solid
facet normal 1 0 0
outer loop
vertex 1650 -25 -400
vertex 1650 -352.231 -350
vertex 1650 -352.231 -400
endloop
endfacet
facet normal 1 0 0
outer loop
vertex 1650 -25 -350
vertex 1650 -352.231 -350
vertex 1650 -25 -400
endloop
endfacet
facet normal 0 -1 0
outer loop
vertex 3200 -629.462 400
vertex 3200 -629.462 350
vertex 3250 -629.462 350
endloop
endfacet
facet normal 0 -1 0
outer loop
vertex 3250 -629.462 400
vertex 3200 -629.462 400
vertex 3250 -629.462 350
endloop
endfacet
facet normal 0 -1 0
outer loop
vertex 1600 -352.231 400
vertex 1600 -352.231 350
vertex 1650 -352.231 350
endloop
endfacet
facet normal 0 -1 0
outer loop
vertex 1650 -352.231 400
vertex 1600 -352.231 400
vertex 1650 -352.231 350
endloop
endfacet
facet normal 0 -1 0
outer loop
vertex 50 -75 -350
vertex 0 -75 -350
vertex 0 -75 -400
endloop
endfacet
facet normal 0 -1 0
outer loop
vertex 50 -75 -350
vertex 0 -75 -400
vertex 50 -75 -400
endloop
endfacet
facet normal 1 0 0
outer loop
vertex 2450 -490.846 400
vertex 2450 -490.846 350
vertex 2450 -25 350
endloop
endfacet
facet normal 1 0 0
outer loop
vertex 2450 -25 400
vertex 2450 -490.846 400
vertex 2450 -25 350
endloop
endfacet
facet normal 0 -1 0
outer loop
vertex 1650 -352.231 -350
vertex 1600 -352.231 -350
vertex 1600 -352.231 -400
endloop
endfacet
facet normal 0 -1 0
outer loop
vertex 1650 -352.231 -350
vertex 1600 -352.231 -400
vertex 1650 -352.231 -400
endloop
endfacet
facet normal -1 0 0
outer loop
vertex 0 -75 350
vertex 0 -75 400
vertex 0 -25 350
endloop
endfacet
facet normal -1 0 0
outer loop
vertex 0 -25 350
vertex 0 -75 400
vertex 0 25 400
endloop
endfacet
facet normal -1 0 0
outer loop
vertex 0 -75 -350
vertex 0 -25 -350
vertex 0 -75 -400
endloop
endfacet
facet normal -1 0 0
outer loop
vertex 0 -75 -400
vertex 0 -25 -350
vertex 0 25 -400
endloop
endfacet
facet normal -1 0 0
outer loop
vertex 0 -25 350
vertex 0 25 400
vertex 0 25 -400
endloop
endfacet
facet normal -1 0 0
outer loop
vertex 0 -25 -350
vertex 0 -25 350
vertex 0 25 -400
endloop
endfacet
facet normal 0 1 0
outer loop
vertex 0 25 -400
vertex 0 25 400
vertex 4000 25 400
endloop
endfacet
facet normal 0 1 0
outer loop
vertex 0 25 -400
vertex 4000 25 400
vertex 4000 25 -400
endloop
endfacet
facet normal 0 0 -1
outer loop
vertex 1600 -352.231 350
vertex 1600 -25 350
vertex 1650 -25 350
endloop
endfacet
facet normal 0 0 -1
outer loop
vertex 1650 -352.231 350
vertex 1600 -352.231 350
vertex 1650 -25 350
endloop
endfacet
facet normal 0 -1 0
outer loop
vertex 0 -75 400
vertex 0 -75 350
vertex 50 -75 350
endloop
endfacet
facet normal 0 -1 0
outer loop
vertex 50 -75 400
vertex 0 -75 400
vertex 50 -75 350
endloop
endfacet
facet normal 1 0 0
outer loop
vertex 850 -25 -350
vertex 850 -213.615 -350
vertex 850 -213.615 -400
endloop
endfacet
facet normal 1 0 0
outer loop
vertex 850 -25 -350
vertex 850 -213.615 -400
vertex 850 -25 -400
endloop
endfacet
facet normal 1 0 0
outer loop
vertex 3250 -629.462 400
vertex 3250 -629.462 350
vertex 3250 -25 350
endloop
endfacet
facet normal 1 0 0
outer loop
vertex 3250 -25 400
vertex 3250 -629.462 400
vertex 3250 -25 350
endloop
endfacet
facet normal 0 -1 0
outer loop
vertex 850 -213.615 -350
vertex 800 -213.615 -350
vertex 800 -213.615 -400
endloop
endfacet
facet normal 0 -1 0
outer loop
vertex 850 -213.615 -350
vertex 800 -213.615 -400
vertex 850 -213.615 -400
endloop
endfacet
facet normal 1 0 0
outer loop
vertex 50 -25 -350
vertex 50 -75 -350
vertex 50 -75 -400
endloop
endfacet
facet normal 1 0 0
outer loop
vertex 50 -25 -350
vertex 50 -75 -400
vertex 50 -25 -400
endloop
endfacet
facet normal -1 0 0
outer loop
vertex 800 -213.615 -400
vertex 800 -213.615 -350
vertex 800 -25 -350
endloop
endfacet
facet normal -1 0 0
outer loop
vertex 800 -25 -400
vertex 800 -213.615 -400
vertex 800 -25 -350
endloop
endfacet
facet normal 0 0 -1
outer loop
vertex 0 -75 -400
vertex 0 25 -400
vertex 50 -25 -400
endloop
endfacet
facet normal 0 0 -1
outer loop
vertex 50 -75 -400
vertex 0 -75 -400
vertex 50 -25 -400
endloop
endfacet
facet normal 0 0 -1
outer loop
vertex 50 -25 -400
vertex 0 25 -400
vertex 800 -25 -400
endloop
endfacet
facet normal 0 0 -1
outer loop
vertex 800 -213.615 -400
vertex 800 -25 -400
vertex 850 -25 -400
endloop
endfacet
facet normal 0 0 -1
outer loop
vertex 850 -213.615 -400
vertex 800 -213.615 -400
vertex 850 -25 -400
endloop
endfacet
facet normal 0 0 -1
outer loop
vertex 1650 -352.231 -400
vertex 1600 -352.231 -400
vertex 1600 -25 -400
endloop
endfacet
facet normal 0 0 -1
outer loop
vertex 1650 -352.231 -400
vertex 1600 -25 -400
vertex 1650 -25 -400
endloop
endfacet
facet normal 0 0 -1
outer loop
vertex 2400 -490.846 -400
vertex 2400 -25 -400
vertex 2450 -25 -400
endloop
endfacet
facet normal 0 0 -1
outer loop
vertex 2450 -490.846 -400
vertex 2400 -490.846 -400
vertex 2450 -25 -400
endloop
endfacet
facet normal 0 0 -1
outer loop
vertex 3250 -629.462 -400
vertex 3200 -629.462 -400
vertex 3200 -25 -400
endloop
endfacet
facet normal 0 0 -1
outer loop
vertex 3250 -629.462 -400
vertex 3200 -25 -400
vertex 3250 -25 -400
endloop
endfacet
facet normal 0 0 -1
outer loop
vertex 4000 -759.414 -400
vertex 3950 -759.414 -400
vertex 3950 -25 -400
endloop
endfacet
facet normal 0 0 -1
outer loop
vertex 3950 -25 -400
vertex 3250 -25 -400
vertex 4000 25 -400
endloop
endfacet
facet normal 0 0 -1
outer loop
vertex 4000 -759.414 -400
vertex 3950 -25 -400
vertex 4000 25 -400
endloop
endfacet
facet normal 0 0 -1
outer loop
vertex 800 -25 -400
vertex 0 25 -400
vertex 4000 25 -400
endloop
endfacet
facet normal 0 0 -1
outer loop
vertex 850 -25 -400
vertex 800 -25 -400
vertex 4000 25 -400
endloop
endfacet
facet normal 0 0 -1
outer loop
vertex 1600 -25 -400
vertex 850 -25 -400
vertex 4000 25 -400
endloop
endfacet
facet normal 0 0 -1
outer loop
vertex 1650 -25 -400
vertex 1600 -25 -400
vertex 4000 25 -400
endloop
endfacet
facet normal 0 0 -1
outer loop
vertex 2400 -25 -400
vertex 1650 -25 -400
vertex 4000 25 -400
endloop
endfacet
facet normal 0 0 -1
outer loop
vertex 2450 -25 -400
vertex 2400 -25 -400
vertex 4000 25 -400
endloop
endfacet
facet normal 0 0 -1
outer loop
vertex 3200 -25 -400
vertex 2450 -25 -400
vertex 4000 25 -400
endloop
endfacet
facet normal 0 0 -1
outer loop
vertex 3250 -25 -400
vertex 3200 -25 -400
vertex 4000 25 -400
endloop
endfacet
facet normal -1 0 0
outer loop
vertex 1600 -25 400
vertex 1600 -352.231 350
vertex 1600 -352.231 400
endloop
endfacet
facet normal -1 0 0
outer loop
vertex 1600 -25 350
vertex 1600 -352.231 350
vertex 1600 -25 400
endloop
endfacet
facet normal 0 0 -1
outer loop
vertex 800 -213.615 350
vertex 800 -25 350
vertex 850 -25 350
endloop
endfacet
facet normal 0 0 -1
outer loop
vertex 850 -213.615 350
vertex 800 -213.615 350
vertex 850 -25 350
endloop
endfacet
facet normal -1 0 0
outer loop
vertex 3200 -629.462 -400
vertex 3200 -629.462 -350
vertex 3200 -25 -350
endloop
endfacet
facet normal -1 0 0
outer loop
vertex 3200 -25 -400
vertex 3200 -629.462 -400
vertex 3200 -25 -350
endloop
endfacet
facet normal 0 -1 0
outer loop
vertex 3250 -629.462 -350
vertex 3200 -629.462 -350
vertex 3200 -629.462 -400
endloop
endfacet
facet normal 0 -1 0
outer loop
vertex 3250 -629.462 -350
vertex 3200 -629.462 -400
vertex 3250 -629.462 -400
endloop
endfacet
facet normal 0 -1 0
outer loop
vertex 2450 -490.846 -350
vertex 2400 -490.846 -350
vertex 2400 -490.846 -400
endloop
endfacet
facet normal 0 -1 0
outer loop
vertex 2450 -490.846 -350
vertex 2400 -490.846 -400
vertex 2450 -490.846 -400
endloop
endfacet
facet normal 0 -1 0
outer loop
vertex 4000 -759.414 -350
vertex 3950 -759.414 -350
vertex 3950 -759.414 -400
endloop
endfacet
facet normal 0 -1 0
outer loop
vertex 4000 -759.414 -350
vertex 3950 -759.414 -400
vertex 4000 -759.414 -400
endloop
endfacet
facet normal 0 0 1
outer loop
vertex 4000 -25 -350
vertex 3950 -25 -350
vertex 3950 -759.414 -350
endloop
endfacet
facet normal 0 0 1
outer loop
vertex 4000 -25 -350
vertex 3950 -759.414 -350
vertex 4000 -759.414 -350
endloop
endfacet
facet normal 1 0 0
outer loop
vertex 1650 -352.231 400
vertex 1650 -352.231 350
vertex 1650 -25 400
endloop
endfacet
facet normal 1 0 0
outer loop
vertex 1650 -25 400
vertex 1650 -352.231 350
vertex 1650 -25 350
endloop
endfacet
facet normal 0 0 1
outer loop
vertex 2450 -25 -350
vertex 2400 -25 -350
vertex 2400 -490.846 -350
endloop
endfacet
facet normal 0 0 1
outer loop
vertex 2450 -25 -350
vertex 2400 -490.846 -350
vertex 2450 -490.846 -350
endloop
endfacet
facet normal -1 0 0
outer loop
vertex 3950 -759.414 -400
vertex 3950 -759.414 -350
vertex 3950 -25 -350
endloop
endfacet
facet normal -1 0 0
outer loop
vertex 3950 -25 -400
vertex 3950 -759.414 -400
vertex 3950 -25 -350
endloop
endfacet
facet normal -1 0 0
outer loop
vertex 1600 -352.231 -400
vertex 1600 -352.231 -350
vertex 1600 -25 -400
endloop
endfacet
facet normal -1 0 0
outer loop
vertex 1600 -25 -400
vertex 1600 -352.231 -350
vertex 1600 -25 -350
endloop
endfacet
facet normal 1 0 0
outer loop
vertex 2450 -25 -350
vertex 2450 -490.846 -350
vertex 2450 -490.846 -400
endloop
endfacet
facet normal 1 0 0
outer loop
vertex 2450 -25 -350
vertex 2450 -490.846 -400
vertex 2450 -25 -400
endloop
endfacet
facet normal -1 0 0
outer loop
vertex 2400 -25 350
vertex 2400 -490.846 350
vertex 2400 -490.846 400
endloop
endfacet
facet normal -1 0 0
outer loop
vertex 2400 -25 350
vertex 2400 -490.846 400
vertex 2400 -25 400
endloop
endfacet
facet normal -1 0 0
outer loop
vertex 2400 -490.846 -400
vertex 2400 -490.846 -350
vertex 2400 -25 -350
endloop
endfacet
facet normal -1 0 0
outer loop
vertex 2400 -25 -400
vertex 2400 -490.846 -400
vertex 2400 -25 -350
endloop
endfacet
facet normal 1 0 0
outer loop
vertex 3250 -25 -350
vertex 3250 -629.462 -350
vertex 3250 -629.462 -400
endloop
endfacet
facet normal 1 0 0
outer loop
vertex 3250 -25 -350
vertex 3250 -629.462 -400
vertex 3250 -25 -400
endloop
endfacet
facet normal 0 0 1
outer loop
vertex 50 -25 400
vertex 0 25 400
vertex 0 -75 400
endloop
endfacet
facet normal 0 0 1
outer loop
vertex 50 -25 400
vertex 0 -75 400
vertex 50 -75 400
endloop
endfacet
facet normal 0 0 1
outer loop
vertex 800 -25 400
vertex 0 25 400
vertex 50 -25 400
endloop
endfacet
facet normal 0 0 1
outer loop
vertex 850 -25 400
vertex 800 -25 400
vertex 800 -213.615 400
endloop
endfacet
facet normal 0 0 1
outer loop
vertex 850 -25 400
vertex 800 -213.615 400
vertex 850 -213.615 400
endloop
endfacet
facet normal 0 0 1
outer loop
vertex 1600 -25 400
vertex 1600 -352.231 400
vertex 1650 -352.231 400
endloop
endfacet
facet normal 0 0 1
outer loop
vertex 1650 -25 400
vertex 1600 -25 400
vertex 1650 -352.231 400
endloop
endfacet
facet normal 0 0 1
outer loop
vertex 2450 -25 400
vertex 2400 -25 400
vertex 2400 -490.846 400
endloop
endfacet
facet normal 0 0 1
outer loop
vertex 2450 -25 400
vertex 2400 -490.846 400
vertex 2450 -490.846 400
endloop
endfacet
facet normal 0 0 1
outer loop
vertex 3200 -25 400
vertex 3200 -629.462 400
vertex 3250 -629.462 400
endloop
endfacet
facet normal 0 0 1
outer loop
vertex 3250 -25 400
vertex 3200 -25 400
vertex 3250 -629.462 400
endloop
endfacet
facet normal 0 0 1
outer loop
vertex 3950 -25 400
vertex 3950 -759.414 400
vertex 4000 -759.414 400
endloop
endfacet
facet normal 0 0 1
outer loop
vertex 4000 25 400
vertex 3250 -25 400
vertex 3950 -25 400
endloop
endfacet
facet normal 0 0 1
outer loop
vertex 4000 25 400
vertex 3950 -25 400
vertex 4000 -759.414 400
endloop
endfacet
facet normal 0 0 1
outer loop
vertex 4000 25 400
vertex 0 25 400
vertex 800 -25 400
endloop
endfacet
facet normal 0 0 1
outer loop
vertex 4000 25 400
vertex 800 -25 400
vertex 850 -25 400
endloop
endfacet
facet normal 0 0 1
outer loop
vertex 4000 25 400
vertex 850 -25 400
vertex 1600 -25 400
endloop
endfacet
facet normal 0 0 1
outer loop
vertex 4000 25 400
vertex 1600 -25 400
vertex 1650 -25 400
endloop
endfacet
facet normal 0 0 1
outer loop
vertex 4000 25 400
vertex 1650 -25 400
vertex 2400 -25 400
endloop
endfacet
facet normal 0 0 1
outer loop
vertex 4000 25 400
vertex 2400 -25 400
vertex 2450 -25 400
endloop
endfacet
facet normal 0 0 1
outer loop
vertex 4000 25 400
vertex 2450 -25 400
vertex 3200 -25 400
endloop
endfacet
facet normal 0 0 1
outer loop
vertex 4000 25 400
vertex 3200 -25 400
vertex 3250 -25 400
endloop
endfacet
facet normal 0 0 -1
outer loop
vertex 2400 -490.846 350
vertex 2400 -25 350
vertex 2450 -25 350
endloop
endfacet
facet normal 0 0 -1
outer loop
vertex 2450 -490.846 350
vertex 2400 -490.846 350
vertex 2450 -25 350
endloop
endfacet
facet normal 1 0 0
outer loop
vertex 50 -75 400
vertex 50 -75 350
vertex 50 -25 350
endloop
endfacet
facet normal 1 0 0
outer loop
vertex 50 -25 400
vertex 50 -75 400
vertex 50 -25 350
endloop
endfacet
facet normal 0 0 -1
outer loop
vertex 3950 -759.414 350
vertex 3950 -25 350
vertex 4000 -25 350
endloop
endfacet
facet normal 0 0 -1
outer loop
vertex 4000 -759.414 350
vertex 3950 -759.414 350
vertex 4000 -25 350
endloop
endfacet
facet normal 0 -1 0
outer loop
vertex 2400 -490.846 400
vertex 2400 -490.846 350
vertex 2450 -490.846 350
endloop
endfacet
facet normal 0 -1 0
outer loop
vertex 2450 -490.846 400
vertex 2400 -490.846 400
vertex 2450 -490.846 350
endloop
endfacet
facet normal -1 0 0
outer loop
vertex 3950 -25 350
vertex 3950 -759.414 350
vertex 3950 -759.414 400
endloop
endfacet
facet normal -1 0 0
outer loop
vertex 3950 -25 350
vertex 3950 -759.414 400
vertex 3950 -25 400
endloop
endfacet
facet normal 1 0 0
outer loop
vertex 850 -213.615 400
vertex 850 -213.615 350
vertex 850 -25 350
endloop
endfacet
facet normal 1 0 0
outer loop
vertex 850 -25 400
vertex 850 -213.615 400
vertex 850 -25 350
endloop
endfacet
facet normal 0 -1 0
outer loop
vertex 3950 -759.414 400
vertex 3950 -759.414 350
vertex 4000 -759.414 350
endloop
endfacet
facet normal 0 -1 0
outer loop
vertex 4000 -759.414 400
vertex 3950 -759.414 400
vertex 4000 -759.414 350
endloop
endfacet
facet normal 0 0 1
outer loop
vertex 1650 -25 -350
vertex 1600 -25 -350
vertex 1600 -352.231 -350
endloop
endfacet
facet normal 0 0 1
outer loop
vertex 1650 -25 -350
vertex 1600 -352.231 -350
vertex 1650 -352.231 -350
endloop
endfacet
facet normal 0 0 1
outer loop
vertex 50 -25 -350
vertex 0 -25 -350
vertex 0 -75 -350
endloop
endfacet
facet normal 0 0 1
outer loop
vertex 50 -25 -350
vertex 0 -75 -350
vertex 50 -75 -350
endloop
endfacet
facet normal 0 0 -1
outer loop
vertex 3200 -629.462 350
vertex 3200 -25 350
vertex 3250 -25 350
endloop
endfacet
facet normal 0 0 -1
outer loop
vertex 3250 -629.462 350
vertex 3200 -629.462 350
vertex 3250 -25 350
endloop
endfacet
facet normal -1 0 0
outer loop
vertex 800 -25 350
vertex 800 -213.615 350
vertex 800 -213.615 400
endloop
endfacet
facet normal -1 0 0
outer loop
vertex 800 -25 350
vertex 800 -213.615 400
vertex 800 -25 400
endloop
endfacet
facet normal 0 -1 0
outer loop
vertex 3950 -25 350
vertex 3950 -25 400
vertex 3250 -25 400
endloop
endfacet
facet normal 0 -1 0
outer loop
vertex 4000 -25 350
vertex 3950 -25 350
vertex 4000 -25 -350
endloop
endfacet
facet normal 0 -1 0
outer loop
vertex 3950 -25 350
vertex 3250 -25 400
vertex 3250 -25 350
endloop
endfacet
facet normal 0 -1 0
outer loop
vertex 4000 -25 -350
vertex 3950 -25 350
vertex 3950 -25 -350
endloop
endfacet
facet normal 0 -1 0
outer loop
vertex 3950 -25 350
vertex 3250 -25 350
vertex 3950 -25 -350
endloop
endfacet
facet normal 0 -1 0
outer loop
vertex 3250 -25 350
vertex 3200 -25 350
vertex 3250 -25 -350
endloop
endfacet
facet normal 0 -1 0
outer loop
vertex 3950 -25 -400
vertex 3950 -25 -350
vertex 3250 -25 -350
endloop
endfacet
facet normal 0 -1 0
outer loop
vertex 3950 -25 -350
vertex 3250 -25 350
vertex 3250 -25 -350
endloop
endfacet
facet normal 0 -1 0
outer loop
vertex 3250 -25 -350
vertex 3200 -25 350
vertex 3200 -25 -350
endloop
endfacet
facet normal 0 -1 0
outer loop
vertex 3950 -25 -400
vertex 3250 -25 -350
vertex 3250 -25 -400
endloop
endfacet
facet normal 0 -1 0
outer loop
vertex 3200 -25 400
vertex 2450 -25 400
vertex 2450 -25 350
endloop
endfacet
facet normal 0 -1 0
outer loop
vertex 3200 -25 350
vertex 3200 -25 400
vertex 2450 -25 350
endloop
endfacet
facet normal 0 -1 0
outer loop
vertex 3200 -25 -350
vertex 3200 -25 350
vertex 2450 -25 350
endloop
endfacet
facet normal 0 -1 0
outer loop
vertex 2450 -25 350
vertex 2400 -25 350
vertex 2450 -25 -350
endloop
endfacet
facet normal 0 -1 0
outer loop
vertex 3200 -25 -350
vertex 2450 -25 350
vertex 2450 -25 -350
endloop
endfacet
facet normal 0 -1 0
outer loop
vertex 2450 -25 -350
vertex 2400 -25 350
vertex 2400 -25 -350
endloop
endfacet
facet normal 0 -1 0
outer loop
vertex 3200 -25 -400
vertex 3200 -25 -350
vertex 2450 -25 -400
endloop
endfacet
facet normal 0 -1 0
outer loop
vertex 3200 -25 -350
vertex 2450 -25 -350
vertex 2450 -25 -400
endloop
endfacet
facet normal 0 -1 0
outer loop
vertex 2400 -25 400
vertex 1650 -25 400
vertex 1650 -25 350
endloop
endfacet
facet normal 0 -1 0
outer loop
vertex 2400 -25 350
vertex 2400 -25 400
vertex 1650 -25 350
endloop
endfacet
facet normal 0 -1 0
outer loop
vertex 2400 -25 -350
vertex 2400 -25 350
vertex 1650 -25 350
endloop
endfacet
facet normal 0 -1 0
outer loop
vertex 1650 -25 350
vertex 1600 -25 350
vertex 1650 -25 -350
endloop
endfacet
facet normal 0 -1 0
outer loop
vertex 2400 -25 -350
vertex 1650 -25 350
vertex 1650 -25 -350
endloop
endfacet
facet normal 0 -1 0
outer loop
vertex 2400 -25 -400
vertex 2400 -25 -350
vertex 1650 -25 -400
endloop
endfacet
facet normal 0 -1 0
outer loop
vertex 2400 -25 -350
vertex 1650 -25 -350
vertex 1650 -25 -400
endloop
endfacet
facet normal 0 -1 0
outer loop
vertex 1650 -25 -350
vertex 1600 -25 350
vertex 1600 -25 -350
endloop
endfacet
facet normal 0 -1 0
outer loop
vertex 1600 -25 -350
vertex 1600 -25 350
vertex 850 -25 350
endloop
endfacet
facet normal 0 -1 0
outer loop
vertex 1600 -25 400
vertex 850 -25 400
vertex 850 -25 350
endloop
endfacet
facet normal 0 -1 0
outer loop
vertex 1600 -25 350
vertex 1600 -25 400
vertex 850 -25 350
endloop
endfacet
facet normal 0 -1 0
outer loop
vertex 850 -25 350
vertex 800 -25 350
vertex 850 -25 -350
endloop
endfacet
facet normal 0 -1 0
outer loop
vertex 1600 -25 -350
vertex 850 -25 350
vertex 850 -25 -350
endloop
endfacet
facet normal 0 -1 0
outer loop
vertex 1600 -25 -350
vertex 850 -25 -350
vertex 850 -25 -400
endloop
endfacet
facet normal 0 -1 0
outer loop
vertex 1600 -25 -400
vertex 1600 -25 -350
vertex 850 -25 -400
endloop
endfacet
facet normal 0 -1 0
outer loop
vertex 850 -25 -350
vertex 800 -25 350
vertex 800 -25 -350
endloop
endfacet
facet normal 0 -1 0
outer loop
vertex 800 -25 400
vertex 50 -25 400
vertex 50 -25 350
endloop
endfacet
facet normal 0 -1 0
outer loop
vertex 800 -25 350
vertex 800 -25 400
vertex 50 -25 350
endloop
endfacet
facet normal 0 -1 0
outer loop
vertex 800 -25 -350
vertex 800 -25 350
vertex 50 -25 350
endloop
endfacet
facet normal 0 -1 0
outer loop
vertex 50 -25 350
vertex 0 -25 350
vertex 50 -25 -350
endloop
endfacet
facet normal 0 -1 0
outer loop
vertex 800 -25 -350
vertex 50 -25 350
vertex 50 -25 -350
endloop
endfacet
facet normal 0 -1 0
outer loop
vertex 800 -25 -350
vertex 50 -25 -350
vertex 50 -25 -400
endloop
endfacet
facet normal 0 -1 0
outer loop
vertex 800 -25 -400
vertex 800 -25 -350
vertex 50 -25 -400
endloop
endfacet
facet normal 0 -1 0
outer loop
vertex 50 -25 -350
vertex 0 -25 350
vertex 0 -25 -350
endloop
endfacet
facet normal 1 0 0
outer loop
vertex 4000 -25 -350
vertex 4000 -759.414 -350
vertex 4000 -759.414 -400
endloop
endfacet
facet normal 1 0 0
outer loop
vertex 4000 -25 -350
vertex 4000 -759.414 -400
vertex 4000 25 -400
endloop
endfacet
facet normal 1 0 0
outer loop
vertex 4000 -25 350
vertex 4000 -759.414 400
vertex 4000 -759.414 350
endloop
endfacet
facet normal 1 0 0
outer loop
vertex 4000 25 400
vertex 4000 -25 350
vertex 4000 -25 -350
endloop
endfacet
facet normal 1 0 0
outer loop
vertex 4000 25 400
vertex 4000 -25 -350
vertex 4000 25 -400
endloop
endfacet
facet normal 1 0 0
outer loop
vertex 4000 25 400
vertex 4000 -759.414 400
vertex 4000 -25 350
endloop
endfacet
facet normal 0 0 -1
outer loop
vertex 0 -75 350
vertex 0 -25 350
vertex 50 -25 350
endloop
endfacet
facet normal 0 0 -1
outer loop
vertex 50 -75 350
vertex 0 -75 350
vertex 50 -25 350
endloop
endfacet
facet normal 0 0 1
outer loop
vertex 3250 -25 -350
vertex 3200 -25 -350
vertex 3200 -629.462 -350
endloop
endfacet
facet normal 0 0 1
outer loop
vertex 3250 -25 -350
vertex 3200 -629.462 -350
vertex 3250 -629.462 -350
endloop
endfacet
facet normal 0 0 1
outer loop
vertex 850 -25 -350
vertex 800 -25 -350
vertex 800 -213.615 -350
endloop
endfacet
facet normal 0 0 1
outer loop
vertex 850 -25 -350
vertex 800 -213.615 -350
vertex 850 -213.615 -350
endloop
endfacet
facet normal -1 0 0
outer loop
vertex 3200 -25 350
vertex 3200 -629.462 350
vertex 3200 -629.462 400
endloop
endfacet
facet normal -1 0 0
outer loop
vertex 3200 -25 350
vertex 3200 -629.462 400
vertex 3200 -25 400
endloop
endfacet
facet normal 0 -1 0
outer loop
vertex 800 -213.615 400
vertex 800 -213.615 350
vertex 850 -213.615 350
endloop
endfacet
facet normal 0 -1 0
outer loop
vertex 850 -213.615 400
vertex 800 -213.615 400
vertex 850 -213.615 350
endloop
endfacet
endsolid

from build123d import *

# Parameters (mm, degrees)
ESBO_O1_W                      = 800
ESBO_O1_H                      = 50
RESSALTO_EXTRUS_O1_DEPTH       = 4000
RESSALTO_EXTRUS_O2_START       = 350
RESSALTO_EXTRUS_O2_OUTLINE_W   = 50
RESSALTO_EXTRUS_O2_OUTLINE_H   = 734.413585936
RESSALTO_EXTRUS_O2_OUTLINE_H_2 = 50
RESSALTO_EXTRUS_O2_OUTLINE_H_3 = 188.61540981
RESSALTO_EXTRUS_O2_OUTLINE_H_4 = 327.23081962
RESSALTO_EXTRUS_O2_OUTLINE_H_5 = 465.84622943
RESSALTO_EXTRUS_O2_OUTLINE_H_6 = 604.461639239
RESSALTO_EXTRUS_O2_DEPTH       = 50


# Read off the part's stored shape, not the designer's step: Ressalto-extrusão2
with BuildPart() as part:
    # Esboço1 → Ressalto-extrusão1 (new body)
    with BuildSketch(Plane(origin=(0, 0, 0), x_dir=(0, 0, -1), z_dir=(1, 0, 0))):
        Rectangle(ESBO_O1_W, ESBO_O1_H)
    extrude(amount=RESSALTO_EXTRUS_O1_DEPTH)

    # Ressalto-extrusão2 outline → Ressalto-extrusão2 (add)
    with BuildSketch(Plane.XY.offset(RESSALTO_EXTRUS_O2_START)):
        with Locations((3975, -392.206792968)):
            Rectangle(RESSALTO_EXTRUS_O2_OUTLINE_W, RESSALTO_EXTRUS_O2_OUTLINE_H)
        with Locations((25, -50)):
            Rectangle(RESSALTO_EXTRUS_O2_OUTLINE_W, RESSALTO_EXTRUS_O2_OUTLINE_H_2)
        with Locations((825, -119.307704905)):
            Rectangle(RESSALTO_EXTRUS_O2_OUTLINE_W, RESSALTO_EXTRUS_O2_OUTLINE_H_3)
        with Locations((1625, -188.61540981)):
            Rectangle(RESSALTO_EXTRUS_O2_OUTLINE_W, RESSALTO_EXTRUS_O2_OUTLINE_H_4)
        with Locations((2425, -257.923114715)):
            Rectangle(RESSALTO_EXTRUS_O2_OUTLINE_W, RESSALTO_EXTRUS_O2_OUTLINE_H_5)
        with Locations((3225, -327.23081962)):
            Rectangle(RESSALTO_EXTRUS_O2_OUTLINE_W, RESSALTO_EXTRUS_O2_OUTLINE_H_6)
    ressalto_extrus_o2 = extrude(amount=RESSALTO_EXTRUS_O2_DEPTH)

    # Espelhar1: Ressalto-extrusão2 across plane
    add(ressalto_extrus_o2.mirror(Plane.XY))


solid = part.part
